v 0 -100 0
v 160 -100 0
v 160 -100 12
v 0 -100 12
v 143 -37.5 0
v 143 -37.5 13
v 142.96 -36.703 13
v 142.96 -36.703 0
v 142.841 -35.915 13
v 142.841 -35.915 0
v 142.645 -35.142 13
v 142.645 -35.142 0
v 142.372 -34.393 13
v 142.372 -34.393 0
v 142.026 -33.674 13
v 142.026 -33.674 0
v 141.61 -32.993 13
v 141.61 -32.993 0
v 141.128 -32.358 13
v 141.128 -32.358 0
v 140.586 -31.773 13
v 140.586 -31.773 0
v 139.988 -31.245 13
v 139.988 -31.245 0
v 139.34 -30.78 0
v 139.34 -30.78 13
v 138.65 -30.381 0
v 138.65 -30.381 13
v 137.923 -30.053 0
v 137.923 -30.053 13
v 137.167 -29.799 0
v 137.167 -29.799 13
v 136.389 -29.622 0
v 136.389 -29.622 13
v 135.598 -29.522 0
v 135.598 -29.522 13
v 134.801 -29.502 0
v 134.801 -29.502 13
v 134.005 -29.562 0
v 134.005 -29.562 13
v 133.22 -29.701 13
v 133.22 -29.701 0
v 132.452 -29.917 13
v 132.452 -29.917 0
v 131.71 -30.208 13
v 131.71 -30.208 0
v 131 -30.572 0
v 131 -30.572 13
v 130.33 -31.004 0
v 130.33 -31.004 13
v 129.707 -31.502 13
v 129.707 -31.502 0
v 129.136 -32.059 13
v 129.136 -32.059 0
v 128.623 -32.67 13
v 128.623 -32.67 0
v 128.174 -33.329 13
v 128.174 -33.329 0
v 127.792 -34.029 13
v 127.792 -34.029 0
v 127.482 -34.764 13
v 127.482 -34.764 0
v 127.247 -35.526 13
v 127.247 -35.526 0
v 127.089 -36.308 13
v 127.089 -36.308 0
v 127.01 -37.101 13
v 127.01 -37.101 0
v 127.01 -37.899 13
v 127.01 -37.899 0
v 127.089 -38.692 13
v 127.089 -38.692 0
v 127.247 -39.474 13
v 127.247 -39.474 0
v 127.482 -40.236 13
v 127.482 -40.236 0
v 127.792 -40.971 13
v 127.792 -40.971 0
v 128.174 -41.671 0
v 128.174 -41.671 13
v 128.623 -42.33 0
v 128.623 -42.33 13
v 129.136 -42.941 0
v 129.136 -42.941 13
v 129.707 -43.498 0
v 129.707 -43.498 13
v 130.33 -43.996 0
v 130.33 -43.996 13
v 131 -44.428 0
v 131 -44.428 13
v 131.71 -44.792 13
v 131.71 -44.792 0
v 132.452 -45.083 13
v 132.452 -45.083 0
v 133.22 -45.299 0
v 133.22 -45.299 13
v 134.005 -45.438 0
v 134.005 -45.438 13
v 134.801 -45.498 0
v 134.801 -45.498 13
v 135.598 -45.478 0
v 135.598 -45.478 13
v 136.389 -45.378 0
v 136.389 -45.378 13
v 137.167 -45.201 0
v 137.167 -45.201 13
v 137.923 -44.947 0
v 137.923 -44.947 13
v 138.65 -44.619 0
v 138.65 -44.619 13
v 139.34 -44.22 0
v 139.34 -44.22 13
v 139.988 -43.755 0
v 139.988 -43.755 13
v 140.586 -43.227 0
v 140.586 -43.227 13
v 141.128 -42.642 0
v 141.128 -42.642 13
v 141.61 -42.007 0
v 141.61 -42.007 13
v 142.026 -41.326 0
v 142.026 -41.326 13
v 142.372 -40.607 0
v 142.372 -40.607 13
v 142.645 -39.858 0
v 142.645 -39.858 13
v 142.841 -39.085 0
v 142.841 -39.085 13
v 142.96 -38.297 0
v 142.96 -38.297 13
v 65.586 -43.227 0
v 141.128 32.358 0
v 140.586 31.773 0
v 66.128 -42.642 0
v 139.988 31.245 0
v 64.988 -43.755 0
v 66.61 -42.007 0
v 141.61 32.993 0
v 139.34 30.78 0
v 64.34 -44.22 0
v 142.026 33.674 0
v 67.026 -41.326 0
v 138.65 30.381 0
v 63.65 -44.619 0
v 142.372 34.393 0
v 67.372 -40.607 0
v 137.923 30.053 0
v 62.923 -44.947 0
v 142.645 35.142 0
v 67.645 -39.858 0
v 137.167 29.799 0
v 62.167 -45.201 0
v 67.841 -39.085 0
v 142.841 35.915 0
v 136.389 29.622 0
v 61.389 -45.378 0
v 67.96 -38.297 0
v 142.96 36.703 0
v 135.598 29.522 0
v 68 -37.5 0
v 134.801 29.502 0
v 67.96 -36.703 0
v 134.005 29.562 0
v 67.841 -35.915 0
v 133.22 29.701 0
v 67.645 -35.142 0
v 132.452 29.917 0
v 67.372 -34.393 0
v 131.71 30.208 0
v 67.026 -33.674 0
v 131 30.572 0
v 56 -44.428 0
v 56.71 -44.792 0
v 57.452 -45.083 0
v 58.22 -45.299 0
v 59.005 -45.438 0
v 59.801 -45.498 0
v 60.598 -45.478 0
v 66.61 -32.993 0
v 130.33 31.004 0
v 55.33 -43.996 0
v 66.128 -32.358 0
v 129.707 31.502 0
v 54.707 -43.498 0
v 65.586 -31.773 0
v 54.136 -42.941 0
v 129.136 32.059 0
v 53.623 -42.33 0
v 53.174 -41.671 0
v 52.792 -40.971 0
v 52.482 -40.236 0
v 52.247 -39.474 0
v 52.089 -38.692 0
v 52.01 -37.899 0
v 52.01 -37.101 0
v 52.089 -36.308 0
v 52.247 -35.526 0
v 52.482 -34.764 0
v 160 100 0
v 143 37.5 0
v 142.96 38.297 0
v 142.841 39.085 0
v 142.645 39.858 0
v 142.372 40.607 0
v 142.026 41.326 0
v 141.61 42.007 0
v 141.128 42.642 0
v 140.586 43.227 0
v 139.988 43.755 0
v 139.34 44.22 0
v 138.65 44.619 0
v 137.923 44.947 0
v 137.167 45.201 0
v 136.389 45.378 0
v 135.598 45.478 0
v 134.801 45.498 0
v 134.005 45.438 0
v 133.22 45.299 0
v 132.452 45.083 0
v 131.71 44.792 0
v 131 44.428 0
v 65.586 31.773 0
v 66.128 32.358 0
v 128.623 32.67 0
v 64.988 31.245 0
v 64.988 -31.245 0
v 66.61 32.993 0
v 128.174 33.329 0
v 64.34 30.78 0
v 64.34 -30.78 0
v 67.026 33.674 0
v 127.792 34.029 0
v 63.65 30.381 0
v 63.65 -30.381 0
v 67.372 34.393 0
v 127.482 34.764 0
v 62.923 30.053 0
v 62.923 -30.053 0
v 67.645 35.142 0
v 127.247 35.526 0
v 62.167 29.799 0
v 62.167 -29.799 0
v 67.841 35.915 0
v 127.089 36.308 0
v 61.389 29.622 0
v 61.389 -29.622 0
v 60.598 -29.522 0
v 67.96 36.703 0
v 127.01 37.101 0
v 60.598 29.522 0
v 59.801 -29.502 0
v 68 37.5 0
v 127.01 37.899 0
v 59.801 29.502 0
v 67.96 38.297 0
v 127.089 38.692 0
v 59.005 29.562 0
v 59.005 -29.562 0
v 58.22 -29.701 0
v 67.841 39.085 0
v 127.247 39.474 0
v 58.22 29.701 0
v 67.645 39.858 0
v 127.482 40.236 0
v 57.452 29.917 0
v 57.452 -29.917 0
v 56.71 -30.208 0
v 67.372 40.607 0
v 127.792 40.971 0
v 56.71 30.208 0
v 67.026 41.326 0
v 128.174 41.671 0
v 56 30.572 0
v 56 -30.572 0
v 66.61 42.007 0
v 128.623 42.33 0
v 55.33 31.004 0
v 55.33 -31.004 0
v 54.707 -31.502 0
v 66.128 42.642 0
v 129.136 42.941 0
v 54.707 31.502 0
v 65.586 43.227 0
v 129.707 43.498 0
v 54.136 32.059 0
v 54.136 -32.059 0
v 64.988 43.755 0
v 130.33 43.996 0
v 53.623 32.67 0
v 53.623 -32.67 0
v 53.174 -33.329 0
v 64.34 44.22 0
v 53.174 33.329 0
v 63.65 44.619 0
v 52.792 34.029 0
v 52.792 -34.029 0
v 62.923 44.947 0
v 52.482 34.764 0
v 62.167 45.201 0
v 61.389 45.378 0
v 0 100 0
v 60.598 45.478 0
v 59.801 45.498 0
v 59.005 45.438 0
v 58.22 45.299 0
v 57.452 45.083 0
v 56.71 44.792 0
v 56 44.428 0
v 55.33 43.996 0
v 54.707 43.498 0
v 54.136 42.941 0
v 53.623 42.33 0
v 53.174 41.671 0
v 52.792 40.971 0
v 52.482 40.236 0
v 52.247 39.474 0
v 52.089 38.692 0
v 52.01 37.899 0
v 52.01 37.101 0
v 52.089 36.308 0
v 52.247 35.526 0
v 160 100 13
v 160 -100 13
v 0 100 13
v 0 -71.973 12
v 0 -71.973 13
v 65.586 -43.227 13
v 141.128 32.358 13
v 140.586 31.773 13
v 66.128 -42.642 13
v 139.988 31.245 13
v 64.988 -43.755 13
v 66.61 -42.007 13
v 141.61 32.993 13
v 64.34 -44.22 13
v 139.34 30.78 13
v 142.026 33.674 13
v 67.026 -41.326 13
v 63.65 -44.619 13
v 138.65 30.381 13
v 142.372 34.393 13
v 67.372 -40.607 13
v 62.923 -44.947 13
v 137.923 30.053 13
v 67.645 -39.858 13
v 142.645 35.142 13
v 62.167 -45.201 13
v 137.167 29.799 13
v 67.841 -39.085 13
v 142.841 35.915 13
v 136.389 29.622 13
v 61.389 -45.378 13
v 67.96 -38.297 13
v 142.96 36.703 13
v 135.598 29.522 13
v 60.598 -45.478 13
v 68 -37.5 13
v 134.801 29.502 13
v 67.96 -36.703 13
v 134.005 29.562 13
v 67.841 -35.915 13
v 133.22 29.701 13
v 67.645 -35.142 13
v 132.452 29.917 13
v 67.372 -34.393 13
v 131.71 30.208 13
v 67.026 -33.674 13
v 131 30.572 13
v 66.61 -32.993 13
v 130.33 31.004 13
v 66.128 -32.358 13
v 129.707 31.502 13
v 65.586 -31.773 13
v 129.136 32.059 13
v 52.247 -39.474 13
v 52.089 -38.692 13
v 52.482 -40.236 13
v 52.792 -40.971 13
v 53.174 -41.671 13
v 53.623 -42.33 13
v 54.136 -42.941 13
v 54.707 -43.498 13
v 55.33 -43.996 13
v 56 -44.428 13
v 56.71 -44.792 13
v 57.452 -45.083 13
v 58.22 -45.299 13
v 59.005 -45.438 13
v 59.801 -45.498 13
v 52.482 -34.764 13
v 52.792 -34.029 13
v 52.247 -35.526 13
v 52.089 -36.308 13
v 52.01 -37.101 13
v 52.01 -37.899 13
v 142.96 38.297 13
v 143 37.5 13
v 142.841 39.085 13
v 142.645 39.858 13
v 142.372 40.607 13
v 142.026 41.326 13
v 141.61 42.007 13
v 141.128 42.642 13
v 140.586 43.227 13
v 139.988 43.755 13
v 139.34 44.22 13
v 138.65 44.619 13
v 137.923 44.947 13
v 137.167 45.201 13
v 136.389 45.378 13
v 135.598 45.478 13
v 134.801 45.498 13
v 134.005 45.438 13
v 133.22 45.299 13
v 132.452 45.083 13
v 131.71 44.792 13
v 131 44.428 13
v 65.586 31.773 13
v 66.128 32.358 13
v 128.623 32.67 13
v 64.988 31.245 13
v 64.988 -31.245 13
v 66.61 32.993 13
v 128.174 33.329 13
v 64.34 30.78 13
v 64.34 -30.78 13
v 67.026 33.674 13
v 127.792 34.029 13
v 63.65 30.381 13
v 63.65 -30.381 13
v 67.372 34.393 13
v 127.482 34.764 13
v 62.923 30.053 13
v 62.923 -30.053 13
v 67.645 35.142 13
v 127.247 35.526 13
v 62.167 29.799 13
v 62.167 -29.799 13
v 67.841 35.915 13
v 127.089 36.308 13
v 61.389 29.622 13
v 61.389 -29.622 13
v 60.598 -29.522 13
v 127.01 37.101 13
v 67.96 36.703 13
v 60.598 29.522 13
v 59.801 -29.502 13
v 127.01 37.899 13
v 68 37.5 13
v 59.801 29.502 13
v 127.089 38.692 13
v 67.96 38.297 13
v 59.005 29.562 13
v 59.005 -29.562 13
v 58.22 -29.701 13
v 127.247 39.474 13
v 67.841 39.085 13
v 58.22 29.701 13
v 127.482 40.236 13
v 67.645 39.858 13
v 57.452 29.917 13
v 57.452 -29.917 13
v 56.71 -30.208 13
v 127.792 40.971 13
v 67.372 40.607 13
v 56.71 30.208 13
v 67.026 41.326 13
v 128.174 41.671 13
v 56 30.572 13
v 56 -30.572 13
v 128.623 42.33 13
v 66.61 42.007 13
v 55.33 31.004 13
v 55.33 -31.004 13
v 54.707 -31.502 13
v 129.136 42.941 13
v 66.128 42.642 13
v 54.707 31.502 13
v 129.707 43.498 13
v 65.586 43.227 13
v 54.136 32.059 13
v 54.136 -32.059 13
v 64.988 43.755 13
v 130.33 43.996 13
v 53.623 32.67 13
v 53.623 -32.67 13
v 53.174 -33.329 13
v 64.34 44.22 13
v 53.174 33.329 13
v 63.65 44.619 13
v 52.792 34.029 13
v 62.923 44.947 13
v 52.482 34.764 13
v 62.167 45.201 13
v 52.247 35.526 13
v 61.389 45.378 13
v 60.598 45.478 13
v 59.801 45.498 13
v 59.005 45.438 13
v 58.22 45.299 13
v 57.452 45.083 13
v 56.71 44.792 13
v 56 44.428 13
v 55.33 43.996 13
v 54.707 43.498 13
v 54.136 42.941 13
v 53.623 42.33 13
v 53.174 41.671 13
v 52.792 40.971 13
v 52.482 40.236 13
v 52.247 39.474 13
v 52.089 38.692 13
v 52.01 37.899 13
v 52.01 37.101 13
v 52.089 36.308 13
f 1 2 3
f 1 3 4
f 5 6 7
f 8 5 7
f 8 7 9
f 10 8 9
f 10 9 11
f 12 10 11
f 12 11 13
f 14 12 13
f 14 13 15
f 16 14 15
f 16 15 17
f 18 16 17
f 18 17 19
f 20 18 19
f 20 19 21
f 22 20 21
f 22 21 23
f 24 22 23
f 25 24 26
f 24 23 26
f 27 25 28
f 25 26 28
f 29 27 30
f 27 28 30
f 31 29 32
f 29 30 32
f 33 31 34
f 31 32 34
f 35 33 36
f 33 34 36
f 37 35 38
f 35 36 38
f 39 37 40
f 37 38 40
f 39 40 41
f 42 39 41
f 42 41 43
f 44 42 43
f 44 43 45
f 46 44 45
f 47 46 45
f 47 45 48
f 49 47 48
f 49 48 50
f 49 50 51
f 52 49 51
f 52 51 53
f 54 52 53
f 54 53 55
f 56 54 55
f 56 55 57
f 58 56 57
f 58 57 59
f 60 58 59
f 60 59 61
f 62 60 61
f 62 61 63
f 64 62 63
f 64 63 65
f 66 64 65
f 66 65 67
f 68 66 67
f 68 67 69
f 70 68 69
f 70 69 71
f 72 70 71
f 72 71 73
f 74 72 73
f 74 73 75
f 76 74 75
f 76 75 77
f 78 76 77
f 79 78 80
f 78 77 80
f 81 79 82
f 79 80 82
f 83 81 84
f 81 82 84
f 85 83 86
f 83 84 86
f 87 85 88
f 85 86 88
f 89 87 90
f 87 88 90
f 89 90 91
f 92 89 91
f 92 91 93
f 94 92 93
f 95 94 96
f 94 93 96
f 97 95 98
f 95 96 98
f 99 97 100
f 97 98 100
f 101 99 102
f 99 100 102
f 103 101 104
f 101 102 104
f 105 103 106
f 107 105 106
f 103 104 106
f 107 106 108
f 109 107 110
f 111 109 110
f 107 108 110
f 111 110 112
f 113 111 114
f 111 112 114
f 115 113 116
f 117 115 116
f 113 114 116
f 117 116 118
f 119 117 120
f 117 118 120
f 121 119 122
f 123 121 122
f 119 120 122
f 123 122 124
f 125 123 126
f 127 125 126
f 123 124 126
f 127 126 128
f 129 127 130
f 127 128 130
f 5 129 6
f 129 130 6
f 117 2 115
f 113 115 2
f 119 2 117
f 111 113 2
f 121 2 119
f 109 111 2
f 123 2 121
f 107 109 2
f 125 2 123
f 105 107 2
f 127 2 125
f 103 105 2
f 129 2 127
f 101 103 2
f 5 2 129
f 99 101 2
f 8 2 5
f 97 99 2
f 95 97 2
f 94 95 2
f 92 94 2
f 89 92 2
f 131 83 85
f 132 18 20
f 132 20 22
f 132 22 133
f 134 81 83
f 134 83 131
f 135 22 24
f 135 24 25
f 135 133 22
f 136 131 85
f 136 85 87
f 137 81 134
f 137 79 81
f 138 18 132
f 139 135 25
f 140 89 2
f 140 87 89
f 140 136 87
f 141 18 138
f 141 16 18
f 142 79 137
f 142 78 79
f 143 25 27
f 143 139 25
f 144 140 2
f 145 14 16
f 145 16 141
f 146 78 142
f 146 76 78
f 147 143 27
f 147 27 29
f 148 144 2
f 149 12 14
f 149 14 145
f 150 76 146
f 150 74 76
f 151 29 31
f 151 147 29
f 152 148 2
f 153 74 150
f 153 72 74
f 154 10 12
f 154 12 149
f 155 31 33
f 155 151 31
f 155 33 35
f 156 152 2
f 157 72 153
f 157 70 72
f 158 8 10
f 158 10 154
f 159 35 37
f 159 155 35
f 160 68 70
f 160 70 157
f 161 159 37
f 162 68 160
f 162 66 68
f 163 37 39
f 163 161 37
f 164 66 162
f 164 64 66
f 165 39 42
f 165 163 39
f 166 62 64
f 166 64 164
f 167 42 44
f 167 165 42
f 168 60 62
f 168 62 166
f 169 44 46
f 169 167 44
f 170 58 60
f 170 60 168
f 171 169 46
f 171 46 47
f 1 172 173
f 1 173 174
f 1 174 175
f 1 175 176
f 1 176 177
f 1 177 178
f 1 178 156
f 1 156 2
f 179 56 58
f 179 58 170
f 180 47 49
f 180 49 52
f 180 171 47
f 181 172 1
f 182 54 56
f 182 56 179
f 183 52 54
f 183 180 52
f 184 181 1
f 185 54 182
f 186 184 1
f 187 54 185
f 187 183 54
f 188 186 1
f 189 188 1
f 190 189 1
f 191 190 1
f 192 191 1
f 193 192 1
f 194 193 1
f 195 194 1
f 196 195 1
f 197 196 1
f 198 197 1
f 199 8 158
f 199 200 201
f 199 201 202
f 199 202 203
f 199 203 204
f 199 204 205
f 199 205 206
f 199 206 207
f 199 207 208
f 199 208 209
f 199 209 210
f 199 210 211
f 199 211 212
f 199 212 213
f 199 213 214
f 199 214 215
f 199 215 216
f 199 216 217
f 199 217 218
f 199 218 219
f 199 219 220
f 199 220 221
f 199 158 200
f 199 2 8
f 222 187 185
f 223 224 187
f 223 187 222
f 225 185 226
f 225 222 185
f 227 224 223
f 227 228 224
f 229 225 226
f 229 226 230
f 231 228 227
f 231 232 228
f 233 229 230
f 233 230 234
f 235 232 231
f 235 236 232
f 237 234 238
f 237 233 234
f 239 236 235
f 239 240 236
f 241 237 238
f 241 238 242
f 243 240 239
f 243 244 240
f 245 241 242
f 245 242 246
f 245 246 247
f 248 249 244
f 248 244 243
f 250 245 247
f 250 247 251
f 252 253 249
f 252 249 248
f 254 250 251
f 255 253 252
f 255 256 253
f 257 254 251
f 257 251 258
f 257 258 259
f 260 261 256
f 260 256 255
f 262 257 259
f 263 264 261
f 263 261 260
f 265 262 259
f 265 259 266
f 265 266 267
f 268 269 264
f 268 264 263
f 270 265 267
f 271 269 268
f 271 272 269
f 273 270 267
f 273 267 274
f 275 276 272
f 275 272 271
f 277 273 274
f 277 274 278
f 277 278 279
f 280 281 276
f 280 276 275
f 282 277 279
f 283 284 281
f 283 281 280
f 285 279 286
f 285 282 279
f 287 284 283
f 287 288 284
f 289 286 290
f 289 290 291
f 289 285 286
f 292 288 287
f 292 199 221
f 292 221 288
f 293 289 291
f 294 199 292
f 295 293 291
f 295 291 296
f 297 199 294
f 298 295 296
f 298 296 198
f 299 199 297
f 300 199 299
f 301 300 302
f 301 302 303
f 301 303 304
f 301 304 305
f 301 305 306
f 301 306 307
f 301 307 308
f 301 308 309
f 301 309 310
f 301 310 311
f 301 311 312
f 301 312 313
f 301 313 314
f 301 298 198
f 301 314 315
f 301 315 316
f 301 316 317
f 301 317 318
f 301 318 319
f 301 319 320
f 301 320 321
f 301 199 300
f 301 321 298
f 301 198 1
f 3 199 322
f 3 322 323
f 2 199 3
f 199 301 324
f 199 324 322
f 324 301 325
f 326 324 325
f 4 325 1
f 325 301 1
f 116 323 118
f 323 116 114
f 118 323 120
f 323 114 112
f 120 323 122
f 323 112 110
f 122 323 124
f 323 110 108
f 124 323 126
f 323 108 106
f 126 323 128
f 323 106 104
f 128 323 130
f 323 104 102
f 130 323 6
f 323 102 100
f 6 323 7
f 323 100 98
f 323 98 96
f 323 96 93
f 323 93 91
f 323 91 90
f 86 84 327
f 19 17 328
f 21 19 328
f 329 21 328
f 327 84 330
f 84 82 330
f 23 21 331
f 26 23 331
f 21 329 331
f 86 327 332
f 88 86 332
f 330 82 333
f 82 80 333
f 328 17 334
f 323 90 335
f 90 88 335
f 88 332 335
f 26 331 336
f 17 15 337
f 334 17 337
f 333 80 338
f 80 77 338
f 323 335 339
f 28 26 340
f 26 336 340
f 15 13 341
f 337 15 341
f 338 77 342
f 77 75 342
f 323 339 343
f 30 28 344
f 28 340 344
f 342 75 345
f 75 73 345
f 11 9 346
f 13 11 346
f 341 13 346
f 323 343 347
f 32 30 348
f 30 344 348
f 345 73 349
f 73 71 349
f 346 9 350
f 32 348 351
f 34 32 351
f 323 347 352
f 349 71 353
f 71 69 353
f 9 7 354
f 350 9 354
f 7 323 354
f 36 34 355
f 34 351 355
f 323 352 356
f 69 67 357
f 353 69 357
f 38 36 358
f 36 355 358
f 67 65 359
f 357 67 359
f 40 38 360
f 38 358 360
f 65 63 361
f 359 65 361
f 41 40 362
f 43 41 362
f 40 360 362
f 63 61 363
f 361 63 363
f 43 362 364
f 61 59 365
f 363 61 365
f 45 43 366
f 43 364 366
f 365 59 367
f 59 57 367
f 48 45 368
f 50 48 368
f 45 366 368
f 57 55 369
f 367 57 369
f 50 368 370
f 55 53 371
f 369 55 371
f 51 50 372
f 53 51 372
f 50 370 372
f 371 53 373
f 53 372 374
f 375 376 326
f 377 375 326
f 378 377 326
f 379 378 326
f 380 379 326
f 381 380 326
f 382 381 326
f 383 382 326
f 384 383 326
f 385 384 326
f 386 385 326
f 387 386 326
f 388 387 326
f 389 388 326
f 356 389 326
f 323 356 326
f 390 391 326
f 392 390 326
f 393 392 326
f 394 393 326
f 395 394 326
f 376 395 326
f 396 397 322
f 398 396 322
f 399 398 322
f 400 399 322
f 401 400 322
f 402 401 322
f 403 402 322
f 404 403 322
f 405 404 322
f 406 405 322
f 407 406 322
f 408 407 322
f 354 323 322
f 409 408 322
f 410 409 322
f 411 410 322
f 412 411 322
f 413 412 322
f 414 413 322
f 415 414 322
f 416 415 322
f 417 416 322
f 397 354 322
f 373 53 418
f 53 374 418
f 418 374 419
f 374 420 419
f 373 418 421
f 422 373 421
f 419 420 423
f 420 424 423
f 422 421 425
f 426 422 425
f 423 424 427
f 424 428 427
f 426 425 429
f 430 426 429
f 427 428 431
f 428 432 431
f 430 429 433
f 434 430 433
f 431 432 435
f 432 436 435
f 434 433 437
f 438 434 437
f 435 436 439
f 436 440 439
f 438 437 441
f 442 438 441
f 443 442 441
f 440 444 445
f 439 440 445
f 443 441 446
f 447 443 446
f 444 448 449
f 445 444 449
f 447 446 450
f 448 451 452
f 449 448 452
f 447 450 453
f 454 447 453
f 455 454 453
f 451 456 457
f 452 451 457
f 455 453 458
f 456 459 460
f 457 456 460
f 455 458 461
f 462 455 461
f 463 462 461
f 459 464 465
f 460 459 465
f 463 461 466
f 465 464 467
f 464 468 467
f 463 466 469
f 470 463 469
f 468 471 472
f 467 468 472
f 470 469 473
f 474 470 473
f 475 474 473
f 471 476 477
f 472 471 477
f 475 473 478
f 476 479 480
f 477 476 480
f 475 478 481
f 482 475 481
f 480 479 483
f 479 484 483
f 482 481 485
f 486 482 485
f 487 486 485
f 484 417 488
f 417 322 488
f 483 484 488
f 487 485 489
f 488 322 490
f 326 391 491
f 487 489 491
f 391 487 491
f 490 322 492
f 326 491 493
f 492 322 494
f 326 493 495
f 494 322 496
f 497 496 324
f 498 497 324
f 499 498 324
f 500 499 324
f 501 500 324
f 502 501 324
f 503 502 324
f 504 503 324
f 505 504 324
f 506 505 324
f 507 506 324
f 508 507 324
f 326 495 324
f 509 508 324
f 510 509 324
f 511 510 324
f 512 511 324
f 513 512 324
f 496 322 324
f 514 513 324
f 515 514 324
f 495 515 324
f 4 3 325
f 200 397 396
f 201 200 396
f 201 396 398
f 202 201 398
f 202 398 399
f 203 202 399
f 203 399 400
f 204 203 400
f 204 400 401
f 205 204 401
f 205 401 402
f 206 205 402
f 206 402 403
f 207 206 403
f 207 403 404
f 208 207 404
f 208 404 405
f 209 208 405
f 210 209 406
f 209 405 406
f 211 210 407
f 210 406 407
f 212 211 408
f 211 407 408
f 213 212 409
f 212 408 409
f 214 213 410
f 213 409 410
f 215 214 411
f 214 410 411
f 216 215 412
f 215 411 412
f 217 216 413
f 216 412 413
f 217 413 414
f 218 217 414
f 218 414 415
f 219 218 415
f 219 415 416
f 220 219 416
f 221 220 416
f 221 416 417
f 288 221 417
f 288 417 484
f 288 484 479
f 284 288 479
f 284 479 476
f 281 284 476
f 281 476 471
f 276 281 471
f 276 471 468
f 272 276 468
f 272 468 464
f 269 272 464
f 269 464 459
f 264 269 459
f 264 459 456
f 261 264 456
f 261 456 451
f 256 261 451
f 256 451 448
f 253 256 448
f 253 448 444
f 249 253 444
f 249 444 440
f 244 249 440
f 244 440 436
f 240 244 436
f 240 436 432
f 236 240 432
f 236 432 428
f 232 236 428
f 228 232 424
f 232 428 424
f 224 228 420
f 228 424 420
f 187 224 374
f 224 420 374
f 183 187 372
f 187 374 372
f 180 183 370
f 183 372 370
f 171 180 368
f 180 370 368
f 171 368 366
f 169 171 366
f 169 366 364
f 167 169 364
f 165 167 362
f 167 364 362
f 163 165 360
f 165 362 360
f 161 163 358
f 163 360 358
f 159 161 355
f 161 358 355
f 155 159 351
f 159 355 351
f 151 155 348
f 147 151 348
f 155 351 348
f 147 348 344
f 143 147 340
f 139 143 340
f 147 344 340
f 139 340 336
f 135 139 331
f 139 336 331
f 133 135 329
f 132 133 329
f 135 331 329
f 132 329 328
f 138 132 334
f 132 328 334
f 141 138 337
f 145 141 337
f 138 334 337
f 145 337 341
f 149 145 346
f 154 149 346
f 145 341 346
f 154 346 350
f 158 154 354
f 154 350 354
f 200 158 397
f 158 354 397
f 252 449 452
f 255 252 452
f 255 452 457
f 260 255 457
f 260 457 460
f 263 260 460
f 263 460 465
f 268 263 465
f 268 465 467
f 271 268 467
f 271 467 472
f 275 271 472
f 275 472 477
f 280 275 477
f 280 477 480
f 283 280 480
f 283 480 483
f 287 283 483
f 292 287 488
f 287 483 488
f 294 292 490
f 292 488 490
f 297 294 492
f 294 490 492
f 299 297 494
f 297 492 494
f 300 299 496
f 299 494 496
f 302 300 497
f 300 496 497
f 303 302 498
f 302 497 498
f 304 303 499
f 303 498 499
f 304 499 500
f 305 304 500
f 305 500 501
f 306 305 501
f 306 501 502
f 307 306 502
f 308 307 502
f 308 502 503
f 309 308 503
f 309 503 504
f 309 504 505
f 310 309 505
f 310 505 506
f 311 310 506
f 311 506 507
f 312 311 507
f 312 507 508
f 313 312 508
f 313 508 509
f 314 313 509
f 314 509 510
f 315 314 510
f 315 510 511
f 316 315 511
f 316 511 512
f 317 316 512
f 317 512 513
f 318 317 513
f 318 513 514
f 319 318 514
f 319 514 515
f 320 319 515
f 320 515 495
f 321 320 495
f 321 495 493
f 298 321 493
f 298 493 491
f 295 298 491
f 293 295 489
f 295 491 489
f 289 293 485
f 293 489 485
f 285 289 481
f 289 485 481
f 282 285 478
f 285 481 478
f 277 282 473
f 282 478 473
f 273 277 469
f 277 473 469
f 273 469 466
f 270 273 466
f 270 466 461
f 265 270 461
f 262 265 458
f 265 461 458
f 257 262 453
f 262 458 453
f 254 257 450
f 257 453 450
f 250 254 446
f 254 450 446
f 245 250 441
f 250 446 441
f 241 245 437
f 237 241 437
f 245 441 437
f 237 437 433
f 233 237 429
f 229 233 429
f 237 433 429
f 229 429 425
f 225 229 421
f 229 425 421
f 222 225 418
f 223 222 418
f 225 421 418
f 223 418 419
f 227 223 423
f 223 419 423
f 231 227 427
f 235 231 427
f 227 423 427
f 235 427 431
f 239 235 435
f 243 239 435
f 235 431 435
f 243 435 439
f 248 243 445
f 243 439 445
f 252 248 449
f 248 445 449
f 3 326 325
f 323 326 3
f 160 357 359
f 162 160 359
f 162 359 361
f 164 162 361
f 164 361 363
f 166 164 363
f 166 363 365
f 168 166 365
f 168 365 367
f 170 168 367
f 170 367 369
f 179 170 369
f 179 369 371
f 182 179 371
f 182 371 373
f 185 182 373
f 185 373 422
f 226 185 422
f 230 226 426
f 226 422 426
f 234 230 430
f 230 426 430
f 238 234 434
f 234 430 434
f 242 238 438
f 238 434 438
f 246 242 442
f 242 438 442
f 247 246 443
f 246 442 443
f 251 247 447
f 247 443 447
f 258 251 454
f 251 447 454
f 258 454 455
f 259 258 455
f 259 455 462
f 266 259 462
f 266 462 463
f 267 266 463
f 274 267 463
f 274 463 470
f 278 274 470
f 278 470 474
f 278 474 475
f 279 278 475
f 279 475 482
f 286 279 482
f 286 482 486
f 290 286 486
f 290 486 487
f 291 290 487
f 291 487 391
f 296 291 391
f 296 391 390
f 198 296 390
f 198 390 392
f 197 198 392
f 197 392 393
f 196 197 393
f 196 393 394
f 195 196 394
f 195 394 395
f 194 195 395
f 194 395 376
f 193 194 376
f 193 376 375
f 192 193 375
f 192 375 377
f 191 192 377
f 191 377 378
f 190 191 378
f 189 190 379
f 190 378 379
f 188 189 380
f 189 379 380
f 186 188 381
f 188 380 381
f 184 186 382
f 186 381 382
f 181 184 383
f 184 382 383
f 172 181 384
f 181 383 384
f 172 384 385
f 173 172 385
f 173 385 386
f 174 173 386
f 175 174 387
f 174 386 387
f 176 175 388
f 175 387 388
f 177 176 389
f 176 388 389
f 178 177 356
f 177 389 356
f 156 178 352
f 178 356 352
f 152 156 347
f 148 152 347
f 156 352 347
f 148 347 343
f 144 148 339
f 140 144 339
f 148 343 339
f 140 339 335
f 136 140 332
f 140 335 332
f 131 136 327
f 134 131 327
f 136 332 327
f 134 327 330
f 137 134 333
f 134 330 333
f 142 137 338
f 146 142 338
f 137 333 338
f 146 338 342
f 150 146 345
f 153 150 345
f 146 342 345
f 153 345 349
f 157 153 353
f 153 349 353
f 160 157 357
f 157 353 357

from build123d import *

# Parameters (mm, degrees)
PAD_DEPTH       = 13
POCKET_DEPTH    = 1
SKETCH003_R     = 8
POCKET001_DEPTH = 13.001


with BuildPart() as part:
    # Sketch → Pad (new body)
    with BuildSketch(Plane.XY):
        Polygon((0, 0), (0, 100), (160, 100), (160, -100), (0, -100), align=None)
    extrude(amount=PAD_DEPTH)

    # Sketch002 (on Face7 of Pad) → Pocket (cut)
    with BuildSketch(Plane.XY.offset(13)):
        Polygon((0, -100), (0, -71.973152), (160, -100), align=None)
    extrude(amount=-POCKET_DEPTH, mode=Mode.SUBTRACT)

    # Sketch003 (on Face5 of Pocket) → Pocket001 (cut, through all)
    with BuildSketch(Plane.XY.offset(13)):
        with Locations((60, 37.5)):
            Circle(SKETCH003_R)
        with Locations((135, 37.5)):
            Circle(SKETCH003_R)
        with Locations((135, -37.5)):
            Circle(SKETCH003_R)
        with Locations((60, -37.5)):
            Circle(SKETCH003_R)
    extrude(amount=-POCKET001_DEPTH, mode=Mode.SUBTRACT)


solid = part.part
